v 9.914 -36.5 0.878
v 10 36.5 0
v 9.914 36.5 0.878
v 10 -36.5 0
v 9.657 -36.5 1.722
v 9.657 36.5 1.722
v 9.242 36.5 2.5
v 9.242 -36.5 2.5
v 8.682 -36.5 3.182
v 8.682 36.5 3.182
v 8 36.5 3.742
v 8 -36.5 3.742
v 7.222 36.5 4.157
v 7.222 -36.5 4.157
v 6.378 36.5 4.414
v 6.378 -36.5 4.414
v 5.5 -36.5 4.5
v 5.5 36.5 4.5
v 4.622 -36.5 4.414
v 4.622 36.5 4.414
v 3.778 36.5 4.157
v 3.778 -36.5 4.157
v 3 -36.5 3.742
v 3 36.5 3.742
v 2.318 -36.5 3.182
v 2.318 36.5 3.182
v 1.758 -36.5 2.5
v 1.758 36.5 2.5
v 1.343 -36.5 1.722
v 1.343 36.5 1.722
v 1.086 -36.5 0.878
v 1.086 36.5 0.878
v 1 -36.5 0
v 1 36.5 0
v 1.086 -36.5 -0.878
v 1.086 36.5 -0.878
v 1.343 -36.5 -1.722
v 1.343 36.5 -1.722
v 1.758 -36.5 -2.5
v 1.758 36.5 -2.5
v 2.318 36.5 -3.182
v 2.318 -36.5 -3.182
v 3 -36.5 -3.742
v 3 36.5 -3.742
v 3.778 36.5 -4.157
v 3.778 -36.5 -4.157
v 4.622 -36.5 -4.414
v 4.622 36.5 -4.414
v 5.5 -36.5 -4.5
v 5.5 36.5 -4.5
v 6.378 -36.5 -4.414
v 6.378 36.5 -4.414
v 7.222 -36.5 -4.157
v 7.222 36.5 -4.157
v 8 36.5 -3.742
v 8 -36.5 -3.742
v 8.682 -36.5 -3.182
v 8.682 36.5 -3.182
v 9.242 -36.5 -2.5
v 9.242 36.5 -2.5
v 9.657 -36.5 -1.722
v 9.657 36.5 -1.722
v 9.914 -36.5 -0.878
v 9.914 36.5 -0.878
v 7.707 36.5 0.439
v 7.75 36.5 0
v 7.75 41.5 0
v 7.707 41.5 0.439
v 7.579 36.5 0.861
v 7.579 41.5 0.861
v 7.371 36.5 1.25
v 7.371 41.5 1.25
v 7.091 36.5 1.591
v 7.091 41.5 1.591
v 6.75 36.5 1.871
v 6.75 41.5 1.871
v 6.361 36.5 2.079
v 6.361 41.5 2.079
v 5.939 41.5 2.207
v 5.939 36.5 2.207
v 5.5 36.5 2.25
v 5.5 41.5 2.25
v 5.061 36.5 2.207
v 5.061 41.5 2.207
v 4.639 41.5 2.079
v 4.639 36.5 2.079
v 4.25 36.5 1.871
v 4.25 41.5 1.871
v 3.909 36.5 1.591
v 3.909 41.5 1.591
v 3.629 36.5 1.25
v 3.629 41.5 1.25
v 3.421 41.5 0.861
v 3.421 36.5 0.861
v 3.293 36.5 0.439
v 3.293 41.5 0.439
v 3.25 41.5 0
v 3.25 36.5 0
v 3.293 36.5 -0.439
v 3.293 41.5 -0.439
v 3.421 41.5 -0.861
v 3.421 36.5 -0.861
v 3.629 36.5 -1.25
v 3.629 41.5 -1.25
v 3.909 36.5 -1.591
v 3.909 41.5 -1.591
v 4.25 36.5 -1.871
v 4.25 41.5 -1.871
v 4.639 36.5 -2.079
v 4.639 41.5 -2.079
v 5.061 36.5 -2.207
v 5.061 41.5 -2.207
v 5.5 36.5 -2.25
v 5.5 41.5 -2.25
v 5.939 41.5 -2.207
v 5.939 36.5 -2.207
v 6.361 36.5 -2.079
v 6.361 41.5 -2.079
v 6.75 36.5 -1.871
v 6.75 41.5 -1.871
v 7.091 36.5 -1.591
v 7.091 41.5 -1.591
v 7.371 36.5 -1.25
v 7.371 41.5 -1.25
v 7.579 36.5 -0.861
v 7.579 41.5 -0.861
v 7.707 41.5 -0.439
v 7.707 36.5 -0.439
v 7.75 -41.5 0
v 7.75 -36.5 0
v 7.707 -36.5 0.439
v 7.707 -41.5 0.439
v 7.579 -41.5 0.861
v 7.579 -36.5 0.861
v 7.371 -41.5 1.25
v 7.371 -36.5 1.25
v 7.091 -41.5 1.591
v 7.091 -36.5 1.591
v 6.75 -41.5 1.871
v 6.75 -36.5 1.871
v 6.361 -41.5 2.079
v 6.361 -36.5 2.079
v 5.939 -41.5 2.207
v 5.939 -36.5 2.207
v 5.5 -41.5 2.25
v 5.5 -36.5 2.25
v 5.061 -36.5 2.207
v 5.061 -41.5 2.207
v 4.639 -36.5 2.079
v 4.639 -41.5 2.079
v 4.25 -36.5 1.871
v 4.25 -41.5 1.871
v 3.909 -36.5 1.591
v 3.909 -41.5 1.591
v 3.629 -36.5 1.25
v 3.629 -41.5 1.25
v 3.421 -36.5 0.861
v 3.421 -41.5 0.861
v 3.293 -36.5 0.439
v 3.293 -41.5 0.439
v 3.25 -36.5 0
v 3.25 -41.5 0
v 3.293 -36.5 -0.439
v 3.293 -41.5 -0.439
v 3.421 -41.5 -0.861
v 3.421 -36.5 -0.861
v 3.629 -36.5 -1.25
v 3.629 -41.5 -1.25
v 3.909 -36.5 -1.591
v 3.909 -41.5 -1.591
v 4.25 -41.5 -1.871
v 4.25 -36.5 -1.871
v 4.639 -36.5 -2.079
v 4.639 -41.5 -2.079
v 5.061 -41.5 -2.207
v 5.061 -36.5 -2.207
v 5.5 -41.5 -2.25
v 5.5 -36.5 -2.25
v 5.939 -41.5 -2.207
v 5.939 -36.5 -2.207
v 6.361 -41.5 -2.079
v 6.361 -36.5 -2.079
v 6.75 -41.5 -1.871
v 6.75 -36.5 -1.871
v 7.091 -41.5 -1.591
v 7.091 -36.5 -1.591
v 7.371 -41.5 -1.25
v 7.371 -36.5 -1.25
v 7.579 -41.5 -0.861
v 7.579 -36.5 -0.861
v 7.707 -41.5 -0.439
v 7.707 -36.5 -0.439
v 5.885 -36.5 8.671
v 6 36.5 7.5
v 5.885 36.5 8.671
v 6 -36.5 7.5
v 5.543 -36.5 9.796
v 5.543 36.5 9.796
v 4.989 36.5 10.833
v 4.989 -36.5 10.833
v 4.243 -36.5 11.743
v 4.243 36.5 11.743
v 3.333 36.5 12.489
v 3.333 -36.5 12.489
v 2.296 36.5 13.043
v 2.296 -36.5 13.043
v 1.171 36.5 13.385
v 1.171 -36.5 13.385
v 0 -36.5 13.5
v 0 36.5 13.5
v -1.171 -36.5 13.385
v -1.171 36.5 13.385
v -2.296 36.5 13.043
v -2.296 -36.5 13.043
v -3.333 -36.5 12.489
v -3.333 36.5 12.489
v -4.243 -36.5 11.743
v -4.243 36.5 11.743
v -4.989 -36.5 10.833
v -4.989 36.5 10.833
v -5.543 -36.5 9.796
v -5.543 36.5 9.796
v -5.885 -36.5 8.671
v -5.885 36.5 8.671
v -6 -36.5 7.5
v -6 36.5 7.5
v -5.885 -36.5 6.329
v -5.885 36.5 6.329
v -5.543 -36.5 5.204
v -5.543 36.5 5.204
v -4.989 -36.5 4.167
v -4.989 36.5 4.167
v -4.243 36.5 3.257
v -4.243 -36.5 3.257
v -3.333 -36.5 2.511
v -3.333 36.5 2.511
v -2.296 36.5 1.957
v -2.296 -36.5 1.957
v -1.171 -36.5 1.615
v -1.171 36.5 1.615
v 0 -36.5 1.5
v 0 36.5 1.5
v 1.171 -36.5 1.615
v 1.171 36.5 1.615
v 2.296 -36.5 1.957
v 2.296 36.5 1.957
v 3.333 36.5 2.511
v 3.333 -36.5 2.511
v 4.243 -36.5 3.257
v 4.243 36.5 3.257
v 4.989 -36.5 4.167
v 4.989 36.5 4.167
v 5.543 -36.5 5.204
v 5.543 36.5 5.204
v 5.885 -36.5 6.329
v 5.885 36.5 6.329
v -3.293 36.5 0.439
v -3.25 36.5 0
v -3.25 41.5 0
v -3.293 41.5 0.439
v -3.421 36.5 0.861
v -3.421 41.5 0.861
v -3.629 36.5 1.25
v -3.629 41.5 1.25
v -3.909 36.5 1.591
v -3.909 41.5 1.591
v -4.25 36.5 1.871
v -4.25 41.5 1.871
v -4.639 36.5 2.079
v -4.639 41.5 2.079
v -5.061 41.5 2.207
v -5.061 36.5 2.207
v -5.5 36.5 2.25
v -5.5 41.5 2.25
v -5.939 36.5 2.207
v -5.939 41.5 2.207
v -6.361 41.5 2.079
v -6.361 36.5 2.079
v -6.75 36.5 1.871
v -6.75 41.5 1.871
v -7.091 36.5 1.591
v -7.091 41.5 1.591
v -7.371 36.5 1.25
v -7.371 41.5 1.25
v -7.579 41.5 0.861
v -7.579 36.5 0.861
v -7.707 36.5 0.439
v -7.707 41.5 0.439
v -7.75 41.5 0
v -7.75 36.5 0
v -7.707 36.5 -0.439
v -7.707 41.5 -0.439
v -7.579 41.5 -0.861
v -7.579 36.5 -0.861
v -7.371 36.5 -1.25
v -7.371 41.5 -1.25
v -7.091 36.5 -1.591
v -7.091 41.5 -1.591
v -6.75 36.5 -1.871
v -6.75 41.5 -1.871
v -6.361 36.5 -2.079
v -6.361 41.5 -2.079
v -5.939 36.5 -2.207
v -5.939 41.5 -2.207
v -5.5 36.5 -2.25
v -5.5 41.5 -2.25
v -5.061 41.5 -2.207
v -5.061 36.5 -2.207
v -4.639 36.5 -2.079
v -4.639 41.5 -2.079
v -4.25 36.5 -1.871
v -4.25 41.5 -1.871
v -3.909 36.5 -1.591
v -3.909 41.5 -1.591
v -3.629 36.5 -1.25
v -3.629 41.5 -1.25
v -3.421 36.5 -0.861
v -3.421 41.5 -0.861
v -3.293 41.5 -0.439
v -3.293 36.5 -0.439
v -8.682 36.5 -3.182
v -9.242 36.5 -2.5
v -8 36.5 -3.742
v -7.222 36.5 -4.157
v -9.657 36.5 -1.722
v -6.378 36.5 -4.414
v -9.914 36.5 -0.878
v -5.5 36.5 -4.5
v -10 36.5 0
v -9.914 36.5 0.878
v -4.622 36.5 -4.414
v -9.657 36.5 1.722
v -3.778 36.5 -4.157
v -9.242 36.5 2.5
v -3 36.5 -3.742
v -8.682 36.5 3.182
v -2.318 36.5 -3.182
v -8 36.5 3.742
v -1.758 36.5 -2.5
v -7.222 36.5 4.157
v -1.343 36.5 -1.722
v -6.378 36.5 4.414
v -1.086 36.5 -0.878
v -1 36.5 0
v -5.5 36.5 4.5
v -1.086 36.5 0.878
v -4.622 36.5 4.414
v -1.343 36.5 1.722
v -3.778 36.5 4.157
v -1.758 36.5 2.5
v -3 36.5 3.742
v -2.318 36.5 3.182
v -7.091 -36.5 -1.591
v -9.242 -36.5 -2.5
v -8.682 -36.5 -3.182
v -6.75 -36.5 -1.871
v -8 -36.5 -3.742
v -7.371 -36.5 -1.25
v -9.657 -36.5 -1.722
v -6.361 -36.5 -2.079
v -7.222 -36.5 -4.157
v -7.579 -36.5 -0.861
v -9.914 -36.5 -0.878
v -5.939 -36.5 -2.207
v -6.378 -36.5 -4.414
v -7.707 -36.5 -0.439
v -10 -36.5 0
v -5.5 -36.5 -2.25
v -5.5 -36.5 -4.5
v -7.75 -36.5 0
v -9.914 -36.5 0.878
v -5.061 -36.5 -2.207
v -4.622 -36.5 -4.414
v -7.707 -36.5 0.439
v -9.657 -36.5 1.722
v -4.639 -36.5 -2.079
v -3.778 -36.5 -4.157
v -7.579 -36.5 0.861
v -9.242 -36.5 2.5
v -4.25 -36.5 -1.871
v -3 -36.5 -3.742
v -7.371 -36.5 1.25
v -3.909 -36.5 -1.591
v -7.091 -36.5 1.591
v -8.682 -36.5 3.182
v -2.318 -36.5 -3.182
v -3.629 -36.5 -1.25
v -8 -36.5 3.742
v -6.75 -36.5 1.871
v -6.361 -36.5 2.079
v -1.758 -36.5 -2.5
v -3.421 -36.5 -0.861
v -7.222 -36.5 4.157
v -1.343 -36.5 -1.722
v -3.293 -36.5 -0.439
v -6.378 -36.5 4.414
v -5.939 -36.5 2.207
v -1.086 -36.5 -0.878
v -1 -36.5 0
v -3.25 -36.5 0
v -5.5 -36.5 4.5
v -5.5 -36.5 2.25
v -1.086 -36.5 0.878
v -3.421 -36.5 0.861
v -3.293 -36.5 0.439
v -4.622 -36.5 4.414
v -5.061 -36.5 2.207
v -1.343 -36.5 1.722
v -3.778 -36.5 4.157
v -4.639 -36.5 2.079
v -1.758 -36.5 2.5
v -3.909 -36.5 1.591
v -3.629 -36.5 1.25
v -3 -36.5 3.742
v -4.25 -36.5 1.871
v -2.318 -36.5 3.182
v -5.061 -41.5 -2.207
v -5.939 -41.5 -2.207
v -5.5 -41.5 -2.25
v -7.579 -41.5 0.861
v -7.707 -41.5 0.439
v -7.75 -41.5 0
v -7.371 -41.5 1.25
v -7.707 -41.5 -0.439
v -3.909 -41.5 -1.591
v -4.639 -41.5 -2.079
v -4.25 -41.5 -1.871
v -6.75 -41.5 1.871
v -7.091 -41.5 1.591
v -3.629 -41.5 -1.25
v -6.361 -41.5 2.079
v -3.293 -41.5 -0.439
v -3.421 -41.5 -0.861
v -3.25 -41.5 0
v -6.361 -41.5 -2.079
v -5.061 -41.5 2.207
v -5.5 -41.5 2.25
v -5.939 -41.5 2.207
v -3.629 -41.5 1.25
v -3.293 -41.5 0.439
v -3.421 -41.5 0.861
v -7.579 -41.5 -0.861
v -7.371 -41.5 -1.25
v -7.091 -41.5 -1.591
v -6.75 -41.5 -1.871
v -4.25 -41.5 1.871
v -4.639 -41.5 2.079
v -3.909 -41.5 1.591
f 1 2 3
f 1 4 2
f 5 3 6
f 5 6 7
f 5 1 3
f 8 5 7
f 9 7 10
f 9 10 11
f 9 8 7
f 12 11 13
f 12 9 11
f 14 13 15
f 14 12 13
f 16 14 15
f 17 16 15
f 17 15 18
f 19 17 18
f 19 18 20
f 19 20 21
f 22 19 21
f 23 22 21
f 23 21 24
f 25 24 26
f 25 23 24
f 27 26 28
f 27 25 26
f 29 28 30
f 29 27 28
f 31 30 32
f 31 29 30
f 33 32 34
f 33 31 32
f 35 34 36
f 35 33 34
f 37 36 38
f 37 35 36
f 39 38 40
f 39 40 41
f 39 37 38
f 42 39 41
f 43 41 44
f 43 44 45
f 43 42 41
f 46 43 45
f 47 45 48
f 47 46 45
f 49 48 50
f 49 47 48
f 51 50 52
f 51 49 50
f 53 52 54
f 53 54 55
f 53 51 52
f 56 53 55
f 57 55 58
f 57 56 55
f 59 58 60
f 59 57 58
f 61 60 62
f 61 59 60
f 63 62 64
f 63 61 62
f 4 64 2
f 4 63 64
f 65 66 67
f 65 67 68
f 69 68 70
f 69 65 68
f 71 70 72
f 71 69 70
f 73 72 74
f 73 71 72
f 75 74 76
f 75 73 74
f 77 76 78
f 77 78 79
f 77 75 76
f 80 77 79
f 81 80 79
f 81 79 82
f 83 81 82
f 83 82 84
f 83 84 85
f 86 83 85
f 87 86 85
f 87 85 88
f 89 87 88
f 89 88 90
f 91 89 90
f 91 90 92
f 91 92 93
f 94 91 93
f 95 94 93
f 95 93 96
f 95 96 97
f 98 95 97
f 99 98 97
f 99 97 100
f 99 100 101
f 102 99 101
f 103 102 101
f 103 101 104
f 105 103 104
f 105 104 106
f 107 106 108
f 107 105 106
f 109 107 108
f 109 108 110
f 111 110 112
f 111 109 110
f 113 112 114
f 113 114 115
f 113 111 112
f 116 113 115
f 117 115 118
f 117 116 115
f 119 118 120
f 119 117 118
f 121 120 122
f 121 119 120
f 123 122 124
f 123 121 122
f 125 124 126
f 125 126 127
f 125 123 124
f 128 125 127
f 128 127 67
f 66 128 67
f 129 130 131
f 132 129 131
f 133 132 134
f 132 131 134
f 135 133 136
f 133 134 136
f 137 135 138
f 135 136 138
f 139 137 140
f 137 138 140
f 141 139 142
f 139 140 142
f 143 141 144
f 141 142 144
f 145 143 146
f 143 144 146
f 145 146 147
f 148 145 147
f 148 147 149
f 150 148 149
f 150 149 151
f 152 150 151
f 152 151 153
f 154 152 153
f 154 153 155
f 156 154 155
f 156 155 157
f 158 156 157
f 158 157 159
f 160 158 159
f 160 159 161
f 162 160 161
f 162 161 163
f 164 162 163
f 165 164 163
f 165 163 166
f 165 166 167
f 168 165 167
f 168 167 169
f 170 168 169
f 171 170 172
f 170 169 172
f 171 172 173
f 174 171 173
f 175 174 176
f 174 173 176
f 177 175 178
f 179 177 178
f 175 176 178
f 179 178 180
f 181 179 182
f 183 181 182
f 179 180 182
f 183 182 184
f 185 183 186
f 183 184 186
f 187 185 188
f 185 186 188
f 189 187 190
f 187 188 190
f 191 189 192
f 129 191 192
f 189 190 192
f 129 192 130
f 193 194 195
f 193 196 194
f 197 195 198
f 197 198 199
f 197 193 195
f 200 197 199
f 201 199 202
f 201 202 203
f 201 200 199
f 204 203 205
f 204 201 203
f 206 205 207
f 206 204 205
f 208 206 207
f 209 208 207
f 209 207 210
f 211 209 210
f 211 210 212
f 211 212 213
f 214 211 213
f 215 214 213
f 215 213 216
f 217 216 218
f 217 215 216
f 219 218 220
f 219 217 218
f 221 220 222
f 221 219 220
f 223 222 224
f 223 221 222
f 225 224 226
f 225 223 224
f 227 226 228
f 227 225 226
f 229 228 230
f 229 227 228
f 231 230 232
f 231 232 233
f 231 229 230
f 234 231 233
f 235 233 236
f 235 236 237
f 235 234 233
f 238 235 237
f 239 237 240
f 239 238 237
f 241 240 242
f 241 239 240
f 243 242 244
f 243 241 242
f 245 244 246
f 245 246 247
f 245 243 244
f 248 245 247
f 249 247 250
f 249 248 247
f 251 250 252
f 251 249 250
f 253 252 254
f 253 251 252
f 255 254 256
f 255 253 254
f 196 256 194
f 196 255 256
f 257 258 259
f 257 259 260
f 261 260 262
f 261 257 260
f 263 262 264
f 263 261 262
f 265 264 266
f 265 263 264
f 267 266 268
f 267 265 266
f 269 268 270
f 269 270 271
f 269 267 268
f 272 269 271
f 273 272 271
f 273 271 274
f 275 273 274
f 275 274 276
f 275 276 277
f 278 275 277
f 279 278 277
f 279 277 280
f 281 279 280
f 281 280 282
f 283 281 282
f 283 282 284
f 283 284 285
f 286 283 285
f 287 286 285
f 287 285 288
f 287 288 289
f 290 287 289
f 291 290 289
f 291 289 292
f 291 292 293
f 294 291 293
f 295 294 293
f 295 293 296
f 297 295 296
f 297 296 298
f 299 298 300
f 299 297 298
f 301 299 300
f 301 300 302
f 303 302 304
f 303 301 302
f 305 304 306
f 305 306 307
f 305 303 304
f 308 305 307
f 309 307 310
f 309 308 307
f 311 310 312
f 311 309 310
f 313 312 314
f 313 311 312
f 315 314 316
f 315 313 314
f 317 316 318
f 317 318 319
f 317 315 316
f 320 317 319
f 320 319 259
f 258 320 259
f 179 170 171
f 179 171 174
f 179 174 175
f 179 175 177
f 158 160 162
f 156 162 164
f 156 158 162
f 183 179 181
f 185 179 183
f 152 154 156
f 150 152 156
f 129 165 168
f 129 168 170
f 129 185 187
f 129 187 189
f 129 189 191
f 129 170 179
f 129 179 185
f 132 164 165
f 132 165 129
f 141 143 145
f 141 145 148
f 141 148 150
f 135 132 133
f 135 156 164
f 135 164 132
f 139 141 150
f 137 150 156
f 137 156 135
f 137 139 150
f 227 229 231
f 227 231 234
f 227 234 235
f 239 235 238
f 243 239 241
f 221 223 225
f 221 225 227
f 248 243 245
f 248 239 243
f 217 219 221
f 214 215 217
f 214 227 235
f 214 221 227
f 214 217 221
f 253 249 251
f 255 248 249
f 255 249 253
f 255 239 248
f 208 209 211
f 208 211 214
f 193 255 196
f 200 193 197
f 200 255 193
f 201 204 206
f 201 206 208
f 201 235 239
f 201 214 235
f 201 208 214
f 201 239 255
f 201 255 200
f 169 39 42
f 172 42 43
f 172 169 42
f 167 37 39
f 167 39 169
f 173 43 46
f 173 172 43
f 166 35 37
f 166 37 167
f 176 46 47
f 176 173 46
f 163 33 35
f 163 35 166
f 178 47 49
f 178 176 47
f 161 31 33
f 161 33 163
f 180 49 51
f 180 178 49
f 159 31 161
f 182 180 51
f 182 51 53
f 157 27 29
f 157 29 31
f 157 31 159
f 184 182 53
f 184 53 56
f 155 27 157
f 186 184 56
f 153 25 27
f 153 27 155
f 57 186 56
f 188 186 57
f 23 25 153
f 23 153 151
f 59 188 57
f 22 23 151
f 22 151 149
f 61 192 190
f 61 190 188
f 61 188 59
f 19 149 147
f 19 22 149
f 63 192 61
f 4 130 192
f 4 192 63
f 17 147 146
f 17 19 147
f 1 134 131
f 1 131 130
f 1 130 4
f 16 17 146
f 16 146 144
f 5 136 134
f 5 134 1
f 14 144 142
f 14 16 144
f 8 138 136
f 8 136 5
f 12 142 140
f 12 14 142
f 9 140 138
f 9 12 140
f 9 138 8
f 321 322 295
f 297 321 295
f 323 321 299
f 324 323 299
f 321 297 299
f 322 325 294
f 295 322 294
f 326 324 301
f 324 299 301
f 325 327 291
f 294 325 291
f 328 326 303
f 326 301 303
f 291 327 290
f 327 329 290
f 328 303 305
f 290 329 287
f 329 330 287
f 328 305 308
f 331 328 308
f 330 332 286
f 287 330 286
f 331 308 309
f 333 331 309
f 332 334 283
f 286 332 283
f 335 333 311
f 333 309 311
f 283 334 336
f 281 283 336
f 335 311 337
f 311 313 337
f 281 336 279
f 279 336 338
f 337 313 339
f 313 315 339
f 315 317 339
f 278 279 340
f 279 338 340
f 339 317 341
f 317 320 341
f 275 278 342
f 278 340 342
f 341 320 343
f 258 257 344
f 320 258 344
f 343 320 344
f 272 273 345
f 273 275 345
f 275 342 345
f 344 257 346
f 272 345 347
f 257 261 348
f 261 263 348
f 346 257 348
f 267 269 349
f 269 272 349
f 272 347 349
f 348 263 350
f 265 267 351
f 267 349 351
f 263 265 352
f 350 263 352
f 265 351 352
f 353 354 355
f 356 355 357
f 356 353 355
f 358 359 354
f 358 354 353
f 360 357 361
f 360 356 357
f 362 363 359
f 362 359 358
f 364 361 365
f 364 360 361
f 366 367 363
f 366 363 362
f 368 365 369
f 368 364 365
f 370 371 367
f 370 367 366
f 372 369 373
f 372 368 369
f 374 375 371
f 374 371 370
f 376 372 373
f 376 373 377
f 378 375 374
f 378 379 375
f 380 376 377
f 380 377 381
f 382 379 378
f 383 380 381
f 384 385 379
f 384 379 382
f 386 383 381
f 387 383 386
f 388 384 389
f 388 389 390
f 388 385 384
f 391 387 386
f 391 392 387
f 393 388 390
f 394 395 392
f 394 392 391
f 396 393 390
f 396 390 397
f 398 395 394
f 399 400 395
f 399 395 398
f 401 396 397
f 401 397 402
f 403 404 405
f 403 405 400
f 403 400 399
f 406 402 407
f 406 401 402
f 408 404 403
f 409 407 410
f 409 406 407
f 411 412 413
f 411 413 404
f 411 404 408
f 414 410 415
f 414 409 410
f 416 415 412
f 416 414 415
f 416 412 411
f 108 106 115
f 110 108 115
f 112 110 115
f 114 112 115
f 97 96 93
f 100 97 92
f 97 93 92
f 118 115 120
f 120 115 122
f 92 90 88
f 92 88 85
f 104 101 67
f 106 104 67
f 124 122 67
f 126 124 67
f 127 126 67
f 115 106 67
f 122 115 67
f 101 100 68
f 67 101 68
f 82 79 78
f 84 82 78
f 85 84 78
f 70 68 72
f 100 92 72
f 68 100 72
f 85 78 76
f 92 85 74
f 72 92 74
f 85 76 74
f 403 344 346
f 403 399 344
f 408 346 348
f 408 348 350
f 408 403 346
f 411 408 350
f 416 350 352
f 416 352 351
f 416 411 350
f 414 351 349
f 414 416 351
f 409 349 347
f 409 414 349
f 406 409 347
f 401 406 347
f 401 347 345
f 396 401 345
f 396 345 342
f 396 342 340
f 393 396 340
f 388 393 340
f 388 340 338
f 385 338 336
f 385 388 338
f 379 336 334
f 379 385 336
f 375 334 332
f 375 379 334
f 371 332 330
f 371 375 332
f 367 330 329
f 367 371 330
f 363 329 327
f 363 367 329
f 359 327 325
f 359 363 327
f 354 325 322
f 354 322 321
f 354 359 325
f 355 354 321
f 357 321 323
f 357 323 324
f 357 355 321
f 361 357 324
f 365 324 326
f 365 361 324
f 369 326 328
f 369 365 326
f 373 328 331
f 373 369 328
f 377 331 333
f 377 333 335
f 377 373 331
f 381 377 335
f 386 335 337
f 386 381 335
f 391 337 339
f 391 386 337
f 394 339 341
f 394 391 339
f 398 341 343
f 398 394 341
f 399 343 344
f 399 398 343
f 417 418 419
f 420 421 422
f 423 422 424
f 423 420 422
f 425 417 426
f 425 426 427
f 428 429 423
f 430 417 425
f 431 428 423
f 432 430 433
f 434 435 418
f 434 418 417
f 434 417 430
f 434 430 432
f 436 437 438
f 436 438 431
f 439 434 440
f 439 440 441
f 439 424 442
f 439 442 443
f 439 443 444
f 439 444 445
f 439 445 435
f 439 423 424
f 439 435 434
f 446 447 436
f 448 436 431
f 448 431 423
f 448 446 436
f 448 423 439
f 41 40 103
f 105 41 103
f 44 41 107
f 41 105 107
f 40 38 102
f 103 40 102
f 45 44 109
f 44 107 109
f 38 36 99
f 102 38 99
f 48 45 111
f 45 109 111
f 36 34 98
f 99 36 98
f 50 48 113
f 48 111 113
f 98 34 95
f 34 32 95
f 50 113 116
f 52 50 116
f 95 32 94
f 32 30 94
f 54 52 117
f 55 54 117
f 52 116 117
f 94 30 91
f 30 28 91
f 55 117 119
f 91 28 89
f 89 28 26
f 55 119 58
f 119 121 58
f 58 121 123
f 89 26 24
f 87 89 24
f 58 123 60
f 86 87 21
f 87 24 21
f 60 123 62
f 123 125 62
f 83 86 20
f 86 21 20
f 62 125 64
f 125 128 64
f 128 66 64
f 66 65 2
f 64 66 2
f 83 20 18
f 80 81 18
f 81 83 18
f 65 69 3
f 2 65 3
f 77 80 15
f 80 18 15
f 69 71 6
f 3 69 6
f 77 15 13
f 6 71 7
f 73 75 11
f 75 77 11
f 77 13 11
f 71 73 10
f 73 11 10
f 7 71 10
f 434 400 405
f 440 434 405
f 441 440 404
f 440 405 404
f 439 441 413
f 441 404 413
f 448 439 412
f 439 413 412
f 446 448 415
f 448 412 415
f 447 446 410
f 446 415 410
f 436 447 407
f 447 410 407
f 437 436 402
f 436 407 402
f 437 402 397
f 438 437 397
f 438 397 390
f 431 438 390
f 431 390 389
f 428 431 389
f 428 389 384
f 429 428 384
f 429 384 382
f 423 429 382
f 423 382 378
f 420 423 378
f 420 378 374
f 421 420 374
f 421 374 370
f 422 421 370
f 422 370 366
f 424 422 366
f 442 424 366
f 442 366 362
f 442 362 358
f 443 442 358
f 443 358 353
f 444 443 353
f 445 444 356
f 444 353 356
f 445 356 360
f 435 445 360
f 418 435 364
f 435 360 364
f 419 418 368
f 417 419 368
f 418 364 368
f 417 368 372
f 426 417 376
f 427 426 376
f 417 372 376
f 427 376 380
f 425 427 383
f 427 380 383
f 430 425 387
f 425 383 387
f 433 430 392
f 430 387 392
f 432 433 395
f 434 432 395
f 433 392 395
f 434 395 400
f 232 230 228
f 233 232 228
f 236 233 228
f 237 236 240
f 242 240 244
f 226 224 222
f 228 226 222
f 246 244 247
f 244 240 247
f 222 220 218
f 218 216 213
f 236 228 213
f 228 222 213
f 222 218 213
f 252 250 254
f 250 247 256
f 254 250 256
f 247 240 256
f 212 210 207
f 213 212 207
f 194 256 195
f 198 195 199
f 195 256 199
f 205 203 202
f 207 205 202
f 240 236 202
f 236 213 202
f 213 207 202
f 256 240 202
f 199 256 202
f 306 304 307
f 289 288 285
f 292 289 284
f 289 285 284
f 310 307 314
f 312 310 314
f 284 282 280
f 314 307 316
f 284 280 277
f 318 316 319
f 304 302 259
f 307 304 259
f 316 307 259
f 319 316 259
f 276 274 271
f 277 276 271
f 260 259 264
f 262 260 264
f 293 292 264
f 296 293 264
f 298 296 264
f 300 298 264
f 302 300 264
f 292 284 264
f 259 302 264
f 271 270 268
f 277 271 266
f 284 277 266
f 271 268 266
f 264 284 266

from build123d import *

# Parameters (mm, degrees)
F0_R          = 4.5
F1_DEPTH      = 36.5
F1_DEPTH_BACK = 36.5
F2_R          = 2.25
F3_DEPTH      = 41.5
F3_DEPTH_BACK = 41.5
F4_R          = 6
F5_DEPTH      = 36.5
F5_DEPTH_BACK = 36.5


with BuildPart() as f1:
    # F0 (on Front) → F1 (new body, two sides)
    with BuildSketch(Plane.XZ) as f1_sk:
        with Locations((-5.5, 0)):
            Circle(F0_R)
    extrude(amount=F1_DEPTH)
    extrude(f1_sk.sketch, amount=-F1_DEPTH_BACK)

    # F2 (on Front) → F3, piece 2 (join, two sides)
    with BuildSketch(Plane.XZ) as f3_2_sk:
        with Locations((-5.5, 0)):
            Circle(F2_R)
    extrude(amount=F3_DEPTH)
    extrude(f3_2_sk.sketch, amount=-F3_DEPTH_BACK)


with BuildPart() as f1b:
    # F0 (on Front) → F1, piece 2 (new body, two sides)
    with BuildSketch(Plane.XZ) as f1_2_sk:
        with Locations((5.5, 0)):
            Circle(F0_R)
    extrude(amount=F1_DEPTH)
    extrude(f1_2_sk.sketch, amount=-F1_DEPTH_BACK)

    # F2 (on Front) → F3 (join, two sides)
    with BuildSketch(Plane.XZ) as f3_sk:
        with Locations((5.5, 0)):
            Circle(F2_R)
    extrude(amount=F3_DEPTH)
    extrude(f3_sk.sketch, amount=-F3_DEPTH_BACK)


with BuildPart() as f5:
    # F4 (on Front) → F5 (new body, two sides)
    with BuildSketch(Plane.XZ) as f5_sk:
        with Locations((0, 7.5)):
            Circle(F4_R)
    extrude(amount=F5_DEPTH)
    extrude(f5_sk.sketch, amount=-F5_DEPTH_BACK)


solid = Compound([f1.part, f1b.part, f5.part])
